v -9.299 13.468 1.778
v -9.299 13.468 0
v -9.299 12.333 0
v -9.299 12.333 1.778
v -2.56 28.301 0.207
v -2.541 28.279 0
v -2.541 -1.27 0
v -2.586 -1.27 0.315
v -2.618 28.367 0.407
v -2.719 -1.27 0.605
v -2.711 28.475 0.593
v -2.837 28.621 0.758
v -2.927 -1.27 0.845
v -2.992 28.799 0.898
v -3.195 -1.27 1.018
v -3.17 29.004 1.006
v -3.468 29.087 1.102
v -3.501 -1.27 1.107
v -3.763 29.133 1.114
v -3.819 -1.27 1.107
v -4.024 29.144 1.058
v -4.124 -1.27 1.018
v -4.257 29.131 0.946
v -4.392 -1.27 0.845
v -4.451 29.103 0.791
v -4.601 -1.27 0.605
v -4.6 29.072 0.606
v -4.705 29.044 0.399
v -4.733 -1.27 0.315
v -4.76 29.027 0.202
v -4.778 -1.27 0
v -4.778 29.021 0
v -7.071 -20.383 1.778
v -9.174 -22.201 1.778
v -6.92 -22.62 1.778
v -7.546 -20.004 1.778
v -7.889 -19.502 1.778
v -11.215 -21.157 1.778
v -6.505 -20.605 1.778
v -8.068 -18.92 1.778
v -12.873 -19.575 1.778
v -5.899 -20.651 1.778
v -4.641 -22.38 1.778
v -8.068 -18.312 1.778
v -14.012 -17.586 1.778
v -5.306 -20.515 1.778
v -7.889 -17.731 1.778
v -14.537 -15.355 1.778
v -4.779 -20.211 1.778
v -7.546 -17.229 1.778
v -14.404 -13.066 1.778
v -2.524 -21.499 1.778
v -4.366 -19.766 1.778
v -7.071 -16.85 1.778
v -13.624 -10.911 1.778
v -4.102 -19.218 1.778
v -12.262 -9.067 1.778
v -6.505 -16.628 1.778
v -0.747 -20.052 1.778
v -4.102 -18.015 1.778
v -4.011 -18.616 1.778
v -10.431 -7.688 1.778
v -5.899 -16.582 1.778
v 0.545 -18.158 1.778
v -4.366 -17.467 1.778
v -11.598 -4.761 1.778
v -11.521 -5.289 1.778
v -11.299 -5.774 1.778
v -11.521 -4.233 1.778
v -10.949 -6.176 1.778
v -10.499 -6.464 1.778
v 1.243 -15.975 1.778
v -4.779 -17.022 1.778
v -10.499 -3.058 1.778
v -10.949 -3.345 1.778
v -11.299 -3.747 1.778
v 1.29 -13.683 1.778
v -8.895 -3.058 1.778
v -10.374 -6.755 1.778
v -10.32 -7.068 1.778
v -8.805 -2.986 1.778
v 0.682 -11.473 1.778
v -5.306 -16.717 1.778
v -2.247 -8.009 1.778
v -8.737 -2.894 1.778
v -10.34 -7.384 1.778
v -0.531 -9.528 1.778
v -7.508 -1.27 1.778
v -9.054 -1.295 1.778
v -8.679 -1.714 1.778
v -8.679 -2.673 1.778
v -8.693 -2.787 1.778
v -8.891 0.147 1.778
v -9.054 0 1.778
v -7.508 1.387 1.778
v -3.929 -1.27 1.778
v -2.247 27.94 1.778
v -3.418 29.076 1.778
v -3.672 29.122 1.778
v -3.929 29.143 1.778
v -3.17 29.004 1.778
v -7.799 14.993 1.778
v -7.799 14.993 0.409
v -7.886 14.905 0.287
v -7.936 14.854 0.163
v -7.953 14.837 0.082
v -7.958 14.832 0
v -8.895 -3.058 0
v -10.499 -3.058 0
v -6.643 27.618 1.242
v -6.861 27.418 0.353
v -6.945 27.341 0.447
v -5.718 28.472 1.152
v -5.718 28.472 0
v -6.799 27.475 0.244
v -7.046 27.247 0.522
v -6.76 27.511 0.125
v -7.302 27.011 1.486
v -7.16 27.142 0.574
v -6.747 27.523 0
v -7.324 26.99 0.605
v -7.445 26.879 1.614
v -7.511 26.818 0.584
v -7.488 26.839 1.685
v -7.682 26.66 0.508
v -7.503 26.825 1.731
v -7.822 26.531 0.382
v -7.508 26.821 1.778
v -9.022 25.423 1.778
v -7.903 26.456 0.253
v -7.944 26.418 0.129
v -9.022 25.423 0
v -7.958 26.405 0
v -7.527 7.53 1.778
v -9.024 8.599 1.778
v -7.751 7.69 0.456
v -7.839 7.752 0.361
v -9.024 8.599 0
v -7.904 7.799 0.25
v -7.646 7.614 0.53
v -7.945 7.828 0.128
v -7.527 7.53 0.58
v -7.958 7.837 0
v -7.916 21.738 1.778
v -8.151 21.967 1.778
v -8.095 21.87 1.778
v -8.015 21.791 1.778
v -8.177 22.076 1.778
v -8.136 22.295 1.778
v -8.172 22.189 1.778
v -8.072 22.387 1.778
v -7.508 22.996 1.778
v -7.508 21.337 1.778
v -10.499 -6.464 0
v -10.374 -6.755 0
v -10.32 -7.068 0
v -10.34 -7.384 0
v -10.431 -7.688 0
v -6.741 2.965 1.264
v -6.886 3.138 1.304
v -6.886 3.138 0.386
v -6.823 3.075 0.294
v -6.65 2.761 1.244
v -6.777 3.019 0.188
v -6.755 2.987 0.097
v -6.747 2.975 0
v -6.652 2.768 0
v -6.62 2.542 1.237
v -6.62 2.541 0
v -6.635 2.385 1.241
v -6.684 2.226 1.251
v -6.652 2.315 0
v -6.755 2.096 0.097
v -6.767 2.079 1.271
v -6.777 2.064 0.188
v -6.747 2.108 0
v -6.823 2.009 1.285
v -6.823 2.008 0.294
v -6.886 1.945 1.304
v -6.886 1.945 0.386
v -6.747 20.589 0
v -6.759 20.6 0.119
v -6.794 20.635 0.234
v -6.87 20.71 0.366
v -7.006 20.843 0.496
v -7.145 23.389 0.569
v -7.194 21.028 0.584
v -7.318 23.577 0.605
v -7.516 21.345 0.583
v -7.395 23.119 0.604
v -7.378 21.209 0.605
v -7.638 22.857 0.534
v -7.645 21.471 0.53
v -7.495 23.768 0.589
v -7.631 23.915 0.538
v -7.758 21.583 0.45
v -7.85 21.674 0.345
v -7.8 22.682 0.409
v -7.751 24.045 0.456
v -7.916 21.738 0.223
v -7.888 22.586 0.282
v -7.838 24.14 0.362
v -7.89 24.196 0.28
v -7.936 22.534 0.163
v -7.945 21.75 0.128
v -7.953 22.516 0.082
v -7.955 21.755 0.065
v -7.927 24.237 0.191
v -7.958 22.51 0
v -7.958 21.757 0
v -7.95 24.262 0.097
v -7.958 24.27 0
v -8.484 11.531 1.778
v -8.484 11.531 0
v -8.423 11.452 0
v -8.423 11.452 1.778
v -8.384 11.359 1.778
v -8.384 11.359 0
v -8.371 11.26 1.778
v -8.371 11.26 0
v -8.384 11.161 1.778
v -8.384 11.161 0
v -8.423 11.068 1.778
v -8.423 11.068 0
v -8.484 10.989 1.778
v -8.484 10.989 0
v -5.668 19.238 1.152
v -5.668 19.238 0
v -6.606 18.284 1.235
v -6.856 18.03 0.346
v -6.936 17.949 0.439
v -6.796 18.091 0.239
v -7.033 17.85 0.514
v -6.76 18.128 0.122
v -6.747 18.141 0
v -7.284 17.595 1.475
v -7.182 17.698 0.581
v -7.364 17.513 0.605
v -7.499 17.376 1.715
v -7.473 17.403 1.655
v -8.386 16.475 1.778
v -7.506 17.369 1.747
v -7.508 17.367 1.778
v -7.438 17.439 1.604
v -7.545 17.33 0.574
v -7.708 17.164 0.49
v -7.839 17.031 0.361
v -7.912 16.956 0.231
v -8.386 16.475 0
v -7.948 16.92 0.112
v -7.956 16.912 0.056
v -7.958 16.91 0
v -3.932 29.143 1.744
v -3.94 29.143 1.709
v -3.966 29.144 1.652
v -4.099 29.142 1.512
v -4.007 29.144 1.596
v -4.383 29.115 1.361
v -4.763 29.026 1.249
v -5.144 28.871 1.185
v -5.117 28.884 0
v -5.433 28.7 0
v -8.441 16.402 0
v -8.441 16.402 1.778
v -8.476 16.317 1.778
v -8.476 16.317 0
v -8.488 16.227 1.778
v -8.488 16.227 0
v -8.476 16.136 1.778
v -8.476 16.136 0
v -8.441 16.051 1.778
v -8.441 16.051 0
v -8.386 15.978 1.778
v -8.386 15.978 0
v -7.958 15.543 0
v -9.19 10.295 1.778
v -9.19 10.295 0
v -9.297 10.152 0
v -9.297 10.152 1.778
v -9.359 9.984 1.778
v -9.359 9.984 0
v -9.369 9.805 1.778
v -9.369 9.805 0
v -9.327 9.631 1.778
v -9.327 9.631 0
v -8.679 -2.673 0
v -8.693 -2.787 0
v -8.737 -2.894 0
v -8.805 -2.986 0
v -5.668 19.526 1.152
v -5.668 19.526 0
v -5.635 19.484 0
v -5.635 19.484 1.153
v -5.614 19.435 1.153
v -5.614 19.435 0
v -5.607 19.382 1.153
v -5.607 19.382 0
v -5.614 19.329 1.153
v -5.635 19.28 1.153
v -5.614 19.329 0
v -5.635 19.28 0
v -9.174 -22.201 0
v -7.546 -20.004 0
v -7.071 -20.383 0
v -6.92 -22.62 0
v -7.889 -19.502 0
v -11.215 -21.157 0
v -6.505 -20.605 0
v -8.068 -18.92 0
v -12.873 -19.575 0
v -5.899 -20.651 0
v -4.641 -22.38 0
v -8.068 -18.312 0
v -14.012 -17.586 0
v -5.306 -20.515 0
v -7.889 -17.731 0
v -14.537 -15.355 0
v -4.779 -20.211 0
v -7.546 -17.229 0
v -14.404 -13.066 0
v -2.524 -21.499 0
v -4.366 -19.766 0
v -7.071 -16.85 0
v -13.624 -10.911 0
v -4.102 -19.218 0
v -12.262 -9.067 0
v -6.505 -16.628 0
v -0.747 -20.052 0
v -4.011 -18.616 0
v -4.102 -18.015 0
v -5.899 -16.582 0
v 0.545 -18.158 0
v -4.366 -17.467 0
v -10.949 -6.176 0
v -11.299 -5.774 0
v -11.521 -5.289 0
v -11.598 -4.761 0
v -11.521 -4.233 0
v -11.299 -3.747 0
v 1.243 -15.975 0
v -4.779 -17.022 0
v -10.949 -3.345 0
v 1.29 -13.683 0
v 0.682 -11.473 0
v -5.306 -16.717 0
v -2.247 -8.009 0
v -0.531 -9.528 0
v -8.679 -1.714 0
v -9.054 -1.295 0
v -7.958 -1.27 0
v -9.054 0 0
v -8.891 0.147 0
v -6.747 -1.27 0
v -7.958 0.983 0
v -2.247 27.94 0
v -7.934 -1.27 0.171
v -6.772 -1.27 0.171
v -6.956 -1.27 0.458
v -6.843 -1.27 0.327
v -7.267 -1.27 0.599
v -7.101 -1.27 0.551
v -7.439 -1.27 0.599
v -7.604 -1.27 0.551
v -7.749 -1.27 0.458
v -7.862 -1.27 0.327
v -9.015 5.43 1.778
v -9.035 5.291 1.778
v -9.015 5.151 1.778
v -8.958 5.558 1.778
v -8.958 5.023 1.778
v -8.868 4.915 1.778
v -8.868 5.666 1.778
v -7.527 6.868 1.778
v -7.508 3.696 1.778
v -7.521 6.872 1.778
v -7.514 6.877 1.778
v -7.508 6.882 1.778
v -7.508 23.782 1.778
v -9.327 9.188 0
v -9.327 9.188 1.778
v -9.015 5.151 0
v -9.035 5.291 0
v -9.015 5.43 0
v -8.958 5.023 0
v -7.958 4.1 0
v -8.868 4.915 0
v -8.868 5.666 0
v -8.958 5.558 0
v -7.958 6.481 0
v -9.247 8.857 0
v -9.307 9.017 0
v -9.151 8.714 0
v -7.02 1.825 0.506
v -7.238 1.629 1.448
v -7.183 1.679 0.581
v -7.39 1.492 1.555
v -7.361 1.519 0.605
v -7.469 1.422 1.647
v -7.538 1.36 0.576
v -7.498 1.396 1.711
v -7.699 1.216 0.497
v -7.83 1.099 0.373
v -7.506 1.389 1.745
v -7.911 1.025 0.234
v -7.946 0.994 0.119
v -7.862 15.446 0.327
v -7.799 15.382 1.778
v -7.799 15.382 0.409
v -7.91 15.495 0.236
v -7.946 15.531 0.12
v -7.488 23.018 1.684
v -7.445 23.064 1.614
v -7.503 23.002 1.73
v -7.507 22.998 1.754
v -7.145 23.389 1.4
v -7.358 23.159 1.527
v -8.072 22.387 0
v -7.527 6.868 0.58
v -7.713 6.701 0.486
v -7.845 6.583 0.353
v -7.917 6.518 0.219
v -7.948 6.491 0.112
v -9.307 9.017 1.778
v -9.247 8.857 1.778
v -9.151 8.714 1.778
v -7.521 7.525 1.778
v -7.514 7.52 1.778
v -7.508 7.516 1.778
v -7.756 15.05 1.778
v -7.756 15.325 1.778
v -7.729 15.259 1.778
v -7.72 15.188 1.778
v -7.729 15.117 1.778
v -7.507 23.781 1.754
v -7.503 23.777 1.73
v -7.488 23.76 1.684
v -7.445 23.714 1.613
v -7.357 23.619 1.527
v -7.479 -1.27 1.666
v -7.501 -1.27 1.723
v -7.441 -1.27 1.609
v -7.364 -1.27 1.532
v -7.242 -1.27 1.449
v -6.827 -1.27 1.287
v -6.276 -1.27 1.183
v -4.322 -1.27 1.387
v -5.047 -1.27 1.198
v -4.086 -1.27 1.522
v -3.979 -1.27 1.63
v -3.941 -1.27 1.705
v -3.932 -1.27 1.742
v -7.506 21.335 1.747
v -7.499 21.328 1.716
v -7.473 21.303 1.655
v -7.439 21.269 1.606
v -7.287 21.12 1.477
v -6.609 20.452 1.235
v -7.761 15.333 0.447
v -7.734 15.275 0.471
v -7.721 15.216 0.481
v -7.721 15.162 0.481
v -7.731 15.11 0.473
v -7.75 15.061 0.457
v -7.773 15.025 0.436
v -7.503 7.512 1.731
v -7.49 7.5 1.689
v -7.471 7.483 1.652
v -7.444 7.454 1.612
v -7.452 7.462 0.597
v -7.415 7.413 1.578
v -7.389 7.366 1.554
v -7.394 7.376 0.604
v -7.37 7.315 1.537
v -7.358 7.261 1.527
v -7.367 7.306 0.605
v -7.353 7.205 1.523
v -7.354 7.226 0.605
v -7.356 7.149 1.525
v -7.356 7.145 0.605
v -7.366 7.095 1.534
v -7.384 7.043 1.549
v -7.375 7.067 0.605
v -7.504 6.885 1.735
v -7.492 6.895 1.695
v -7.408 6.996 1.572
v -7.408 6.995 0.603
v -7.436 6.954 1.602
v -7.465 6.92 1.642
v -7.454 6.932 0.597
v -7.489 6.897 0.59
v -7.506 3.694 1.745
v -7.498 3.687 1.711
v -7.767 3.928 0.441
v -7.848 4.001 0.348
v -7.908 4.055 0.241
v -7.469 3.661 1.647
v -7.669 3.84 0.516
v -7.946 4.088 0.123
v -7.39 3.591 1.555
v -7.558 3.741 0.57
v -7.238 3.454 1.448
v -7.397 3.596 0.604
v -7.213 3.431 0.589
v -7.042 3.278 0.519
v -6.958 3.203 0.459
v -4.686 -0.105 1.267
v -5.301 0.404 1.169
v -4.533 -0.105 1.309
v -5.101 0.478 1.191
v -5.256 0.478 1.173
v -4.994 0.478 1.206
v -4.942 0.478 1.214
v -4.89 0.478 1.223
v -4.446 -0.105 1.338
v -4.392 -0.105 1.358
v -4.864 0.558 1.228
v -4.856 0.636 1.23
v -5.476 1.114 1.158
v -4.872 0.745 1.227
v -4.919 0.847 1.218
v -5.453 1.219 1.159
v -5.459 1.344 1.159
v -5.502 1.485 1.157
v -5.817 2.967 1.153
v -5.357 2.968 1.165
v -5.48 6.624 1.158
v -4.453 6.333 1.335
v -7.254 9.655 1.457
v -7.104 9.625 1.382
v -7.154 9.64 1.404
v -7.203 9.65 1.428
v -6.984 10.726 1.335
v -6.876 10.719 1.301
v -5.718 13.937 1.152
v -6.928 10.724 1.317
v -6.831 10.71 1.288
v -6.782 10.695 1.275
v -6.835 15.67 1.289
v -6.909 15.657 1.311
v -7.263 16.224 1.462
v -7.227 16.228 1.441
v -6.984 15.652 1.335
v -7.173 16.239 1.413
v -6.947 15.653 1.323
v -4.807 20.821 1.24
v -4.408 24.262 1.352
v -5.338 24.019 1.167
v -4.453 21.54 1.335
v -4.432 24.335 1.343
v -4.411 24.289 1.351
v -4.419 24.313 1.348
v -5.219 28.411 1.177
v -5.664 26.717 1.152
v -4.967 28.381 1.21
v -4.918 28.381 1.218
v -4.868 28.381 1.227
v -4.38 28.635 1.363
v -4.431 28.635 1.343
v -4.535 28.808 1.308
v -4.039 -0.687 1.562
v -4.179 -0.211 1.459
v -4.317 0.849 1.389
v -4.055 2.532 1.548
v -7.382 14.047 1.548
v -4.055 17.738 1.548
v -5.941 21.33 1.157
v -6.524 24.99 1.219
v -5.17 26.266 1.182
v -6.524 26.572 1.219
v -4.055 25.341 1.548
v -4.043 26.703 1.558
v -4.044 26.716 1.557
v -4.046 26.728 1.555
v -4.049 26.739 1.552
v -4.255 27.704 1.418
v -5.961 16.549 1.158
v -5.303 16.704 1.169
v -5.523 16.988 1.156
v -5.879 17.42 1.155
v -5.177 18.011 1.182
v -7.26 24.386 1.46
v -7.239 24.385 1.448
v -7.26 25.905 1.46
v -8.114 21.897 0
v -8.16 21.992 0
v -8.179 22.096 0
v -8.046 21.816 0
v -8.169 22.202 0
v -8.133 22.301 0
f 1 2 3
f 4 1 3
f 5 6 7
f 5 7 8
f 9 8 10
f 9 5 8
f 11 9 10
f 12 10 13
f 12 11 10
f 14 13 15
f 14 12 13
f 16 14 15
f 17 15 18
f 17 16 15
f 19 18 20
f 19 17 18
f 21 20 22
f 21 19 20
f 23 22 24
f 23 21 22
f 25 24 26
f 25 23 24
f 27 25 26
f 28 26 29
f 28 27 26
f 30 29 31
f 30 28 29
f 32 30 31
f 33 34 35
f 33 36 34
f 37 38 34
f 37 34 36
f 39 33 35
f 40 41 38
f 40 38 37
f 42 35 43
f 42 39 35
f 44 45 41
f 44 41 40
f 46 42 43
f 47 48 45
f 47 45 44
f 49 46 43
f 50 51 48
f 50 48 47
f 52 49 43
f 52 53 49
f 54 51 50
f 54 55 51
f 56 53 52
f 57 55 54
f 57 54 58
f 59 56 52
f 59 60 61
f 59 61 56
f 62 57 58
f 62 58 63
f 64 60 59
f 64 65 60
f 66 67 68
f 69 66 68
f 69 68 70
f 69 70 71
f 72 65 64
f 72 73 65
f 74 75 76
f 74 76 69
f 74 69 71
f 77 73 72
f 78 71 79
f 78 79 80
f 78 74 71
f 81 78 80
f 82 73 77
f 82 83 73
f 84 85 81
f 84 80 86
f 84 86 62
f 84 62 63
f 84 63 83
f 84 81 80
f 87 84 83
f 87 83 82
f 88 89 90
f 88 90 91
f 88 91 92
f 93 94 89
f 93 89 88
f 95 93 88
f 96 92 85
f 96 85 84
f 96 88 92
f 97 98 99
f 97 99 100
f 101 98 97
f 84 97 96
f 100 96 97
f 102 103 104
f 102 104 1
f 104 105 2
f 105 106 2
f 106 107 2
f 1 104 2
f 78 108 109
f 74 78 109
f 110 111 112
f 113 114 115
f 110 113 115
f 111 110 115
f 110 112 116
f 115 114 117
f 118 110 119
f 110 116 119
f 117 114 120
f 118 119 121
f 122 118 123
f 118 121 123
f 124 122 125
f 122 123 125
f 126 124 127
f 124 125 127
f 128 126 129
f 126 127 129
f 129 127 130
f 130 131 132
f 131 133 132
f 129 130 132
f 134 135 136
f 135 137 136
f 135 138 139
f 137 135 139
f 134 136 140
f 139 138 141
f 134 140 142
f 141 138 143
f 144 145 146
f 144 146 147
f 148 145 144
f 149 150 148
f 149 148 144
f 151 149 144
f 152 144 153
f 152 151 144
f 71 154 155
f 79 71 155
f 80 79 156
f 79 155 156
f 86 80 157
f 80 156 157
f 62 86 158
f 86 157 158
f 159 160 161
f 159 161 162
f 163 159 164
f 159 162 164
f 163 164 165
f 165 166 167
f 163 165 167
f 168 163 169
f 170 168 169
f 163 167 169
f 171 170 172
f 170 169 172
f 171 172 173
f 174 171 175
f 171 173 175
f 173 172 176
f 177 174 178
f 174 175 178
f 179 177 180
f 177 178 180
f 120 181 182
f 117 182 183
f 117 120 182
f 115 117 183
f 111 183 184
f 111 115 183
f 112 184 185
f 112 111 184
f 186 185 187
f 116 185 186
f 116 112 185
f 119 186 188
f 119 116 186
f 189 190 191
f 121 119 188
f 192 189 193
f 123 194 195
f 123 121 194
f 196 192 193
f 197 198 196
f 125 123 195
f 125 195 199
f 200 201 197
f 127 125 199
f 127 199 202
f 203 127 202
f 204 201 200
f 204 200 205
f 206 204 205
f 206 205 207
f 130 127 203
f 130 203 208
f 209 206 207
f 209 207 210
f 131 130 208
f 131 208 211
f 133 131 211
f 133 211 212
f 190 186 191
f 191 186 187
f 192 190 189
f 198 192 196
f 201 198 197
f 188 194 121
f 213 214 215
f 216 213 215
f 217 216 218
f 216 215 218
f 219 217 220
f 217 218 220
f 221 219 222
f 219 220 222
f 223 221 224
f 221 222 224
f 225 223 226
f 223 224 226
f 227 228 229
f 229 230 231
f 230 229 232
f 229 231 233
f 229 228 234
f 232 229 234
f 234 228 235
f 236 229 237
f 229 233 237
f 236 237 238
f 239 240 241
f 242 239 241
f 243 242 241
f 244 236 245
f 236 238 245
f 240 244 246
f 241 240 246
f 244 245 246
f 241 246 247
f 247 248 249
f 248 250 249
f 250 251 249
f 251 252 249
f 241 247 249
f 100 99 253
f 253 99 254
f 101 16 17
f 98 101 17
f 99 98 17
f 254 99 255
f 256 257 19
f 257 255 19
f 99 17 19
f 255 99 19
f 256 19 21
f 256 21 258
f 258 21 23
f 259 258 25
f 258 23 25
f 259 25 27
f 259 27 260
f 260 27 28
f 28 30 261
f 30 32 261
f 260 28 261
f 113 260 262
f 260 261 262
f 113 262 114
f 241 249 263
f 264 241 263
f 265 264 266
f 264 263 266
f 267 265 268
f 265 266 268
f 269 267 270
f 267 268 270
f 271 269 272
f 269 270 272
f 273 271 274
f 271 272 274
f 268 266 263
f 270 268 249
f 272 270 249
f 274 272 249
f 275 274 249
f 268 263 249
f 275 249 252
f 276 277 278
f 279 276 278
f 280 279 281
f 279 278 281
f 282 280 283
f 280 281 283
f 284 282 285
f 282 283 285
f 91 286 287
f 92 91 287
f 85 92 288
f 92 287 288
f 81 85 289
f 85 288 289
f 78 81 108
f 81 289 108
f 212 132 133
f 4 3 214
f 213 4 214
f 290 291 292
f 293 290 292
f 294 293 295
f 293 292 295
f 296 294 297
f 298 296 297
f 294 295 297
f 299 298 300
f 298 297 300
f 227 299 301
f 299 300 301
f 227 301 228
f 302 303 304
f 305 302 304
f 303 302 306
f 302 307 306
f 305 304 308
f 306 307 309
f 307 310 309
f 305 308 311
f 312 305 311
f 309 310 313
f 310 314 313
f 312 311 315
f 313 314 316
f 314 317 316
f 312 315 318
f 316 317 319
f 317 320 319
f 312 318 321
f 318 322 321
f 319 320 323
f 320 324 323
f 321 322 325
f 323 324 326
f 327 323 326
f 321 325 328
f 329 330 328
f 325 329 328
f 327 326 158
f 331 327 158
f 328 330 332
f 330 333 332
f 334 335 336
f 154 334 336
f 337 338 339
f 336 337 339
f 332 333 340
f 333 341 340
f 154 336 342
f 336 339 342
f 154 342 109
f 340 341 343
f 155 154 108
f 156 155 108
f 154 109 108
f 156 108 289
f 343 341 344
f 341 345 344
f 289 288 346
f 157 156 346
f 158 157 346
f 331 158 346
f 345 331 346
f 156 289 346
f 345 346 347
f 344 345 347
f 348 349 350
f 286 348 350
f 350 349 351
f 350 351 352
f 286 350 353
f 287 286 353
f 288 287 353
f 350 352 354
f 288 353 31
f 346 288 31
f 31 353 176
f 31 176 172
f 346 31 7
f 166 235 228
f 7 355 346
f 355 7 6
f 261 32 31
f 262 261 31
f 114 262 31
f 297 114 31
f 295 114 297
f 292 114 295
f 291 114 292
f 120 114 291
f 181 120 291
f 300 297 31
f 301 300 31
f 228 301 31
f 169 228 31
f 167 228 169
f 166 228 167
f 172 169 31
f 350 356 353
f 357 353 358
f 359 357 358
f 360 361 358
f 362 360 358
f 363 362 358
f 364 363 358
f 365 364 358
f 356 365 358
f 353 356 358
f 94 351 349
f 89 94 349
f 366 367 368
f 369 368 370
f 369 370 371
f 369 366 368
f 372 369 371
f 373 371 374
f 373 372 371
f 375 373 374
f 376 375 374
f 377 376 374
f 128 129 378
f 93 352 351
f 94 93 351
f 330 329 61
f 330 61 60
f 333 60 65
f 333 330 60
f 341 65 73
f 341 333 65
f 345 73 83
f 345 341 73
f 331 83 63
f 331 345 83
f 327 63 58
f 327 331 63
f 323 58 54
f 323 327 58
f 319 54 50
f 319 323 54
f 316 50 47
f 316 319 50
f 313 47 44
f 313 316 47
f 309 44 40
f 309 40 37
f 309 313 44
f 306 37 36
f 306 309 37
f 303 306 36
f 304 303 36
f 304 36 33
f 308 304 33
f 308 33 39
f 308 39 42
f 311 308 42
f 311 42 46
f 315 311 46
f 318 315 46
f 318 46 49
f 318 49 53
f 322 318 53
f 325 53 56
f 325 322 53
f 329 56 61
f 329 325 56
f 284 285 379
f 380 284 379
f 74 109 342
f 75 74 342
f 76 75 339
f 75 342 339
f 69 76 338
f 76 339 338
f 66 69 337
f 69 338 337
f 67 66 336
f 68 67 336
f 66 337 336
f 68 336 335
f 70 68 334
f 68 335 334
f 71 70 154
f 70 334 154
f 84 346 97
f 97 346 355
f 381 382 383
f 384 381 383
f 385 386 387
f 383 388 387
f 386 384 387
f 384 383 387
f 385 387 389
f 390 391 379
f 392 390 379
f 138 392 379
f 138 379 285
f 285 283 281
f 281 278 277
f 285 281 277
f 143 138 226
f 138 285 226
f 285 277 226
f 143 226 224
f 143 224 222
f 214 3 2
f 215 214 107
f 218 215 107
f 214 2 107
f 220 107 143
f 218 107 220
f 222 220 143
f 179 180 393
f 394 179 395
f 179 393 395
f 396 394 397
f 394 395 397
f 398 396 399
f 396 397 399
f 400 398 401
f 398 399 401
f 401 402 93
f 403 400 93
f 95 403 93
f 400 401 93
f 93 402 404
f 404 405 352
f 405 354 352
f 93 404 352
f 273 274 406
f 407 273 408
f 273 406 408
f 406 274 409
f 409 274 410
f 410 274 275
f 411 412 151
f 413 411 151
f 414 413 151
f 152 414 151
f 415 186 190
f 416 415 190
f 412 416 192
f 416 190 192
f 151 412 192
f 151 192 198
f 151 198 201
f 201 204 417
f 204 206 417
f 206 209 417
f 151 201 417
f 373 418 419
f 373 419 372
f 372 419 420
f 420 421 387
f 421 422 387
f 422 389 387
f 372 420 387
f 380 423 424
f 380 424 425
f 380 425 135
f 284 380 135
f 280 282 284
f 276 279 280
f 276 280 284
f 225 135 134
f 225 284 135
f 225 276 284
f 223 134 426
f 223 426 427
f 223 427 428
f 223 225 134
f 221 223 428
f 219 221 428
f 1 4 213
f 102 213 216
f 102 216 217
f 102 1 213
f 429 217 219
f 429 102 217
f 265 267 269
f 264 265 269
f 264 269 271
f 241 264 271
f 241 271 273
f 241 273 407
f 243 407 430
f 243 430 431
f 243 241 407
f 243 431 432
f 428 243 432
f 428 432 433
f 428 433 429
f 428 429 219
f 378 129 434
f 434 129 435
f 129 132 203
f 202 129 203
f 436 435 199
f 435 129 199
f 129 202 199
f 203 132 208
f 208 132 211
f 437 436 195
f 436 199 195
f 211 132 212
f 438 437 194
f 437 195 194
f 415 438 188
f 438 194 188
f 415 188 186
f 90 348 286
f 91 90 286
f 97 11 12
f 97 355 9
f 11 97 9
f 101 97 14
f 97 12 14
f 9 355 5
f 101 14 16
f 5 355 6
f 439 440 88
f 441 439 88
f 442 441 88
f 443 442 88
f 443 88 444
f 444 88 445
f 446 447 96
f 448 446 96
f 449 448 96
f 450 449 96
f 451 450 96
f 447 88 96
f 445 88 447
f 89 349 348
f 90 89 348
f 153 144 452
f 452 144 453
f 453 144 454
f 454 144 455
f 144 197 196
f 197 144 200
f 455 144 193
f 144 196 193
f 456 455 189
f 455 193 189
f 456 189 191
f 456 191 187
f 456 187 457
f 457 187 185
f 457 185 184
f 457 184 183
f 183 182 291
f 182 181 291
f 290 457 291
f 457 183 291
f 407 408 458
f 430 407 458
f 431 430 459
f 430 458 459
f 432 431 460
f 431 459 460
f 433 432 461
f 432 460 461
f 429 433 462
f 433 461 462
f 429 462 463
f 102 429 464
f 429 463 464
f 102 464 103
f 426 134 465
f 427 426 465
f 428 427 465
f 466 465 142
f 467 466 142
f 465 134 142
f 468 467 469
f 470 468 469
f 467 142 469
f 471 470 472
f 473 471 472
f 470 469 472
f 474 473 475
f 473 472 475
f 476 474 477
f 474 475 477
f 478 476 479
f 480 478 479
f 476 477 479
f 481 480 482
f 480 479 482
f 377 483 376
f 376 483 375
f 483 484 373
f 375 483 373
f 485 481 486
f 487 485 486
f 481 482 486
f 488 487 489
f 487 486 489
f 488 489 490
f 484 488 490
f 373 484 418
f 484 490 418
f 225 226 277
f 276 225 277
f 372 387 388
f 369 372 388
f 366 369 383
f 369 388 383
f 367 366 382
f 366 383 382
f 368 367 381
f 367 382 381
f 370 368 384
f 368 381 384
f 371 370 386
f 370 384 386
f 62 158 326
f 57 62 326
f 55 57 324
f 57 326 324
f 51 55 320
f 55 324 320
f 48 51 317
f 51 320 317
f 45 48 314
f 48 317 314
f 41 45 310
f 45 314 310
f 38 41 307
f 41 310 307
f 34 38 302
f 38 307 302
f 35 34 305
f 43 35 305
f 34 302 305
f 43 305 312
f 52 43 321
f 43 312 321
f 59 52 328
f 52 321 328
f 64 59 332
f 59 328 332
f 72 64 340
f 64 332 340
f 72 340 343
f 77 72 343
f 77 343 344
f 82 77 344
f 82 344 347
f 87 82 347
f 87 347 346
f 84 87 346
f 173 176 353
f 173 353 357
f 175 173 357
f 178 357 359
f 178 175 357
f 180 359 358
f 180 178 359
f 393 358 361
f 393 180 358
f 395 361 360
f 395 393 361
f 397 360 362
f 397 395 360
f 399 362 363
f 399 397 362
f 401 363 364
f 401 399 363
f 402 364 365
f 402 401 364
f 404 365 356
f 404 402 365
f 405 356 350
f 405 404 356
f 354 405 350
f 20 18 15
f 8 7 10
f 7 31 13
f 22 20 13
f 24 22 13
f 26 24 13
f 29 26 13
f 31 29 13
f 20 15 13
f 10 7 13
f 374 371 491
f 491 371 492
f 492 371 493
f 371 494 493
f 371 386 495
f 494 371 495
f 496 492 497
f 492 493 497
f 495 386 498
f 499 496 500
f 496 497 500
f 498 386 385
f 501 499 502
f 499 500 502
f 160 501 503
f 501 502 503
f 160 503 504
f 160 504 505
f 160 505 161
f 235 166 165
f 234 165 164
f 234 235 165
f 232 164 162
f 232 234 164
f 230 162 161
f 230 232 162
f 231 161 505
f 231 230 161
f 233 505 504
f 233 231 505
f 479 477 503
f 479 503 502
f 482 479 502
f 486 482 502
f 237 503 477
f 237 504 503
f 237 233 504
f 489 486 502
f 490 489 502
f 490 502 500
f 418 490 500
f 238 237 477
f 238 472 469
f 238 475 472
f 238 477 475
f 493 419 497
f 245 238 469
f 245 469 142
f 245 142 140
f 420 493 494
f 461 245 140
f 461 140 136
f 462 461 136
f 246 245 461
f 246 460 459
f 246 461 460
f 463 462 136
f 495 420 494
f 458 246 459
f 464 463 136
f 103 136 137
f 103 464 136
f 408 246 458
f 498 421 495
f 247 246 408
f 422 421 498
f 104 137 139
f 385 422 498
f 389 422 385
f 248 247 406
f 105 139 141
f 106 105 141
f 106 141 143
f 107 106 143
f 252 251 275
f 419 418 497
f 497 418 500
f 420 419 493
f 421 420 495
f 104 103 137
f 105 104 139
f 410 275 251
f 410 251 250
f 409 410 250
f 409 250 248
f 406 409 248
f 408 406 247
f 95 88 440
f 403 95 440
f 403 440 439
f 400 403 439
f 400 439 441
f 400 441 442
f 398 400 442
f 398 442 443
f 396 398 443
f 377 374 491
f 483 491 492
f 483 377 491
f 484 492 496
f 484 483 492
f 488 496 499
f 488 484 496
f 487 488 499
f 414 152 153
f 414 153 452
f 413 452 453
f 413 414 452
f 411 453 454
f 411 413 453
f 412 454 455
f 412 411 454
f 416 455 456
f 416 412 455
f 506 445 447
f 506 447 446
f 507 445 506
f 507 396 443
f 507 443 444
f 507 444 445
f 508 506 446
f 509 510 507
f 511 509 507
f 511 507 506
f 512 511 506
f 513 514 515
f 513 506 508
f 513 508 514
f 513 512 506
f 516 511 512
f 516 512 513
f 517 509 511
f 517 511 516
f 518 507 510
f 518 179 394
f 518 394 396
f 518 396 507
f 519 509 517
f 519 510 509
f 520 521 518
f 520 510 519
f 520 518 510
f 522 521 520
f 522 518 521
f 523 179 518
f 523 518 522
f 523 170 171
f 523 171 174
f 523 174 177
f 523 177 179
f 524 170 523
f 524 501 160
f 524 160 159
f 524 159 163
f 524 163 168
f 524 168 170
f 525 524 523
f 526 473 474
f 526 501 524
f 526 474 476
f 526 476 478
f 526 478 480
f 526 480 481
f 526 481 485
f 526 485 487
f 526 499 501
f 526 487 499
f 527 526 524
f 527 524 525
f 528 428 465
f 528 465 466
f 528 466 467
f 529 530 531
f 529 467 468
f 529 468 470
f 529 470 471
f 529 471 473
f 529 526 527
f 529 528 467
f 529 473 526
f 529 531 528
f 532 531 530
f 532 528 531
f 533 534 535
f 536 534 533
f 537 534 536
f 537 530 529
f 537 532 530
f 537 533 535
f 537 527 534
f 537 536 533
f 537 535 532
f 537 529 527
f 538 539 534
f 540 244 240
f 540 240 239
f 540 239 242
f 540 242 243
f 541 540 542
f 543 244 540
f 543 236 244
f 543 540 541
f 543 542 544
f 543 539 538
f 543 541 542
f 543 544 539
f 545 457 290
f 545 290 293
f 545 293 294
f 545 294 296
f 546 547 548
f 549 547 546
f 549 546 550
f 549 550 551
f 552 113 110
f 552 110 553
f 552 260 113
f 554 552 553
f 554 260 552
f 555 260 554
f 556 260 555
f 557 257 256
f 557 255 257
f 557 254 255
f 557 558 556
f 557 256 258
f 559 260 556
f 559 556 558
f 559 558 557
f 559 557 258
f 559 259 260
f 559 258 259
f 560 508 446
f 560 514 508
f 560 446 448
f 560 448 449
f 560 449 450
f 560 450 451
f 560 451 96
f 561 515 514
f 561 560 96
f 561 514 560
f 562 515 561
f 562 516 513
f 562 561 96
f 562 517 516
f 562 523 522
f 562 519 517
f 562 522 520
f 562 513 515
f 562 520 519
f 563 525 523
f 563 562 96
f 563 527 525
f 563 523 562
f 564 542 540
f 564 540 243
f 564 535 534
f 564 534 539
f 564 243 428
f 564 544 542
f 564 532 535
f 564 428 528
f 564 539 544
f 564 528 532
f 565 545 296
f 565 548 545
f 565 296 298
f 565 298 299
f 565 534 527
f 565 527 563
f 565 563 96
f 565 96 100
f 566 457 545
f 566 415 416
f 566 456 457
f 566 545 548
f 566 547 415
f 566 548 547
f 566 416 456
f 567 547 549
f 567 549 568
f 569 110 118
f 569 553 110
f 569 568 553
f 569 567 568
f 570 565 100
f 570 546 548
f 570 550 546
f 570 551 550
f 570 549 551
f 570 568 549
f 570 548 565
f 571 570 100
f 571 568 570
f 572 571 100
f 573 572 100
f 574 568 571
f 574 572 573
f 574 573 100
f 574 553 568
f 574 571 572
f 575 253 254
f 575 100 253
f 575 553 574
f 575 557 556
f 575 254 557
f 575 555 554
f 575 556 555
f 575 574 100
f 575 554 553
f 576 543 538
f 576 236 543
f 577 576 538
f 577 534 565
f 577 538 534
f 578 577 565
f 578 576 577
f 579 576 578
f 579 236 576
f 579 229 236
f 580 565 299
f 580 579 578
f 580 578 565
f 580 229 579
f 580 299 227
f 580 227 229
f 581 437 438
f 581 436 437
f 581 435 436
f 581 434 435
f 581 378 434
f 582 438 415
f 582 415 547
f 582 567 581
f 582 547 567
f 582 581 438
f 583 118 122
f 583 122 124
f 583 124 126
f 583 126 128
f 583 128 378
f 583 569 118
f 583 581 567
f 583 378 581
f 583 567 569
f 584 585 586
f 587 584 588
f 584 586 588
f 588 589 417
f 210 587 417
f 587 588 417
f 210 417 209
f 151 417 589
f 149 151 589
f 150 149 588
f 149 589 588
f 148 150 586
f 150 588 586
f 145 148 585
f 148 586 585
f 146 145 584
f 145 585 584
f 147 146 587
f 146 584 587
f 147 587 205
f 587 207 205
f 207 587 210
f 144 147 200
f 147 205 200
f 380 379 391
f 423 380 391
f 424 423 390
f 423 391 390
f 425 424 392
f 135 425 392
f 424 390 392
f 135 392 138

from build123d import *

# Parameters (mm, degrees)
F0_R     = 2.0399875939
F1_DEPTH = 1.778
F4_DEPTH = 30.48


with BuildPart() as f1:
    # F0 (on Top) → F1 (new body)
    with BuildSketch(Plane.XY):
        with BuildLine():
            Line((-2.2474500444, -2.9117424699), (-2.2474500444, 0))
            Line((-2.2474500444, 0), (-2.2474500444, 27.94))
            Line((-2.2474500444, 27.94), (-3.1696630176, 29.0039603153))
            ThreePointArc((-3.1696630176, 29.0039603153), (-4.517606772, 29.0903096878), (-5.7184719481, 28.4719801577))
            Line((-5.7184719481, 28.4719801577), (-9.0223492482, 25.4233760263))
            Line((-9.0223492482, 25.4233760263), (-7.1447999217, 23.3886111528))
            Line((-7.1447999217, 23.3886111528), (-8.0721545964, 22.3873686045))
            ThreePointArc((-8.0721545964, 22.3873686045), (-8.1678301412, 22.0209562196), (-7.915860042, 21.7382498085))
            Line((-7.915860042, 21.7382498085), (-5.6676184759, 19.5264350623))
            ThreePointArc((-5.6676184759, 19.5264350623), (-5.6071773645, 19.382186234), (-5.6676184759, 19.2379374057))
            Line((-5.6676184759, 19.2379374057), (-8.3859020022, 16.4748859237))
            ThreePointArc((-8.3859020022, 16.4748859237), (-8.487586257, 16.2265347605), (-8.3859020022, 15.9781835973))
            Line((-8.3859020022, 15.9781835973), (-7.7991103753, 15.3817279816))
            ThreePointArc((-7.7991103753, 15.3817279816), (-7.7196234979, 15.1875911557), (-7.7991103753, 14.9934543297))
            Line((-7.7991103753, 14.9934543297), (-9.2994498013, 13.4684055134))
            Line((-9.2994498013, 13.4684055134), (-9.2994498013, 12.332922779))
            Line((-9.2994498013, 12.332922779), (-8.4841159, 11.5307992114))
            ThreePointArc((-8.4841159, 11.5307992114), (-8.3706448453, 11.2599890574), (-8.4841159, 10.9891789034))
            Line((-8.4841159, 10.9891789034), (-9.1896303815, 10.2950954218))
            ThreePointArc((-9.1896303815, 10.2950954218), (-9.3591173772, 9.9839753745), (-9.327031672, 9.6311410889))
            Line((-9.327031672, 9.6311410889), (-9.327031672, 9.1877765954))
            ThreePointArc((-9.327031672, 9.1877765954), (-9.2468154608, 8.856566184), (-9.0239448473, 8.5987607017))
            Line((-9.0239448473, 8.5987607017), (-7.5274544806, 7.5296491278))
            ThreePointArc((-7.5274544806, 7.5296491278), (-7.35275153, 7.198711945), (-7.5274544806, 6.8677747622))
            Line((-7.5274544806, 6.8677747622), (-8.8676493615, 5.6657013483))
            ThreePointArc((-8.8676493615, 5.6657013483), (-9.0350987524, 5.290571833), (-8.8676493615, 4.9154423177))
            Line((-8.8676493615, 4.9154423177), (-6.8860357023, 3.1380552151))
            ThreePointArc((-6.8860357023, 3.1380552151), (-6.6197378492, 2.5414798318), (-6.8860357023, 1.9449044485))
            Line((-6.8860357023, 1.9449044485), (-8.8908116128, 0.1467422132))
            Line((-8.8908116128, 0.1467422132), (-9.0544149007, 0))
            Line((-9.0544149007, 0), (-9.0544149007, -1.2954237172))
            Line((-9.0544149007, -1.2954237172), (-8.6787752807, -1.7142253395))
            Line((-8.6787752807, -1.7142253395), (-8.6787752807, -2.6730590034))
            ThreePointArc((-8.6787752807, -2.6730590034), (-8.7365906278, -2.8937386893), (-8.8951829821, -3.0577222351))
            Line((-8.8951829821, -3.0577222351), (-10.4990126565, -3.0577222351))
            ThreePointArc((-10.4990126565, -3.0577222351), (-11.5975153355, -4.7606840963), (-10.4990126565, -6.4636459574))
            ThreePointArc((-10.4990126565, -6.4636459574), (-10.3201001064, -7.0675601765), (-10.4314250686, -7.6875027847))
            ThreePointArc((-10.4314250686, -7.6875027847), (-6.9202814869, -22.620283669), (-2.2474500444, -8.0093042186))
            Line((-2.2474500444, -8.0093042186), (-2.2474500444, -2.9117424699))
        make_face()
        with Locations((-6.0510337353, -18.6164323241)):
            Circle(F0_R, mode=Mode.SUBTRACT)
    extrude(amount=F1_DEPTH)

    # F3 (on offset) → F4 (cut)
    with BuildSketch(Plane.XZ.offset(-29.21)):
        with BuildLine():
            add(Edge.make_bspline(
                [(-7.5080851093, 1.778), (-7.5080851093, 1.1522095813), (-5.7184719481, 1.1522095813), (-3.9288587868, 1.1522095813), (-3.9288587868, 1.778)],
                knots=[0, 0, 0, 1.5707963268, 1.5707963268, 3.1415926536, 3.1415926536, 3.1415926536], degree=2, weights=[1, 0.7071067812, 1, 0.7071067812, 1]))
            Line((-3.9288587868, 1.778), (-5.7184719481, 1.778))
            Line((-5.7184719481, 1.778), (-7.5080851093, 1.778))
        make_face()
        with BuildLine():
            Line((-7.9582390594, 0), (-6.7472640007, 0))
            ThreePointArc((-6.7472640007, 0), (-7.35275153, 0.6054875294), (-7.9582390594, 0))
        make_face()
        with BuildLine():
            Line((-4.7784805667, 0), (-3.1696630176, 0))
            Line((-3.1696630176, 0), (-2.5410559591, 0))
            ThreePointArc((-2.5410559591, 0), (-3.6597682629, 1.1187123038), (-4.7784805667, 0))
        make_face()
    extrude(amount=F4_DEPTH, mode=Mode.SUBTRACT)


solid = f1.part
